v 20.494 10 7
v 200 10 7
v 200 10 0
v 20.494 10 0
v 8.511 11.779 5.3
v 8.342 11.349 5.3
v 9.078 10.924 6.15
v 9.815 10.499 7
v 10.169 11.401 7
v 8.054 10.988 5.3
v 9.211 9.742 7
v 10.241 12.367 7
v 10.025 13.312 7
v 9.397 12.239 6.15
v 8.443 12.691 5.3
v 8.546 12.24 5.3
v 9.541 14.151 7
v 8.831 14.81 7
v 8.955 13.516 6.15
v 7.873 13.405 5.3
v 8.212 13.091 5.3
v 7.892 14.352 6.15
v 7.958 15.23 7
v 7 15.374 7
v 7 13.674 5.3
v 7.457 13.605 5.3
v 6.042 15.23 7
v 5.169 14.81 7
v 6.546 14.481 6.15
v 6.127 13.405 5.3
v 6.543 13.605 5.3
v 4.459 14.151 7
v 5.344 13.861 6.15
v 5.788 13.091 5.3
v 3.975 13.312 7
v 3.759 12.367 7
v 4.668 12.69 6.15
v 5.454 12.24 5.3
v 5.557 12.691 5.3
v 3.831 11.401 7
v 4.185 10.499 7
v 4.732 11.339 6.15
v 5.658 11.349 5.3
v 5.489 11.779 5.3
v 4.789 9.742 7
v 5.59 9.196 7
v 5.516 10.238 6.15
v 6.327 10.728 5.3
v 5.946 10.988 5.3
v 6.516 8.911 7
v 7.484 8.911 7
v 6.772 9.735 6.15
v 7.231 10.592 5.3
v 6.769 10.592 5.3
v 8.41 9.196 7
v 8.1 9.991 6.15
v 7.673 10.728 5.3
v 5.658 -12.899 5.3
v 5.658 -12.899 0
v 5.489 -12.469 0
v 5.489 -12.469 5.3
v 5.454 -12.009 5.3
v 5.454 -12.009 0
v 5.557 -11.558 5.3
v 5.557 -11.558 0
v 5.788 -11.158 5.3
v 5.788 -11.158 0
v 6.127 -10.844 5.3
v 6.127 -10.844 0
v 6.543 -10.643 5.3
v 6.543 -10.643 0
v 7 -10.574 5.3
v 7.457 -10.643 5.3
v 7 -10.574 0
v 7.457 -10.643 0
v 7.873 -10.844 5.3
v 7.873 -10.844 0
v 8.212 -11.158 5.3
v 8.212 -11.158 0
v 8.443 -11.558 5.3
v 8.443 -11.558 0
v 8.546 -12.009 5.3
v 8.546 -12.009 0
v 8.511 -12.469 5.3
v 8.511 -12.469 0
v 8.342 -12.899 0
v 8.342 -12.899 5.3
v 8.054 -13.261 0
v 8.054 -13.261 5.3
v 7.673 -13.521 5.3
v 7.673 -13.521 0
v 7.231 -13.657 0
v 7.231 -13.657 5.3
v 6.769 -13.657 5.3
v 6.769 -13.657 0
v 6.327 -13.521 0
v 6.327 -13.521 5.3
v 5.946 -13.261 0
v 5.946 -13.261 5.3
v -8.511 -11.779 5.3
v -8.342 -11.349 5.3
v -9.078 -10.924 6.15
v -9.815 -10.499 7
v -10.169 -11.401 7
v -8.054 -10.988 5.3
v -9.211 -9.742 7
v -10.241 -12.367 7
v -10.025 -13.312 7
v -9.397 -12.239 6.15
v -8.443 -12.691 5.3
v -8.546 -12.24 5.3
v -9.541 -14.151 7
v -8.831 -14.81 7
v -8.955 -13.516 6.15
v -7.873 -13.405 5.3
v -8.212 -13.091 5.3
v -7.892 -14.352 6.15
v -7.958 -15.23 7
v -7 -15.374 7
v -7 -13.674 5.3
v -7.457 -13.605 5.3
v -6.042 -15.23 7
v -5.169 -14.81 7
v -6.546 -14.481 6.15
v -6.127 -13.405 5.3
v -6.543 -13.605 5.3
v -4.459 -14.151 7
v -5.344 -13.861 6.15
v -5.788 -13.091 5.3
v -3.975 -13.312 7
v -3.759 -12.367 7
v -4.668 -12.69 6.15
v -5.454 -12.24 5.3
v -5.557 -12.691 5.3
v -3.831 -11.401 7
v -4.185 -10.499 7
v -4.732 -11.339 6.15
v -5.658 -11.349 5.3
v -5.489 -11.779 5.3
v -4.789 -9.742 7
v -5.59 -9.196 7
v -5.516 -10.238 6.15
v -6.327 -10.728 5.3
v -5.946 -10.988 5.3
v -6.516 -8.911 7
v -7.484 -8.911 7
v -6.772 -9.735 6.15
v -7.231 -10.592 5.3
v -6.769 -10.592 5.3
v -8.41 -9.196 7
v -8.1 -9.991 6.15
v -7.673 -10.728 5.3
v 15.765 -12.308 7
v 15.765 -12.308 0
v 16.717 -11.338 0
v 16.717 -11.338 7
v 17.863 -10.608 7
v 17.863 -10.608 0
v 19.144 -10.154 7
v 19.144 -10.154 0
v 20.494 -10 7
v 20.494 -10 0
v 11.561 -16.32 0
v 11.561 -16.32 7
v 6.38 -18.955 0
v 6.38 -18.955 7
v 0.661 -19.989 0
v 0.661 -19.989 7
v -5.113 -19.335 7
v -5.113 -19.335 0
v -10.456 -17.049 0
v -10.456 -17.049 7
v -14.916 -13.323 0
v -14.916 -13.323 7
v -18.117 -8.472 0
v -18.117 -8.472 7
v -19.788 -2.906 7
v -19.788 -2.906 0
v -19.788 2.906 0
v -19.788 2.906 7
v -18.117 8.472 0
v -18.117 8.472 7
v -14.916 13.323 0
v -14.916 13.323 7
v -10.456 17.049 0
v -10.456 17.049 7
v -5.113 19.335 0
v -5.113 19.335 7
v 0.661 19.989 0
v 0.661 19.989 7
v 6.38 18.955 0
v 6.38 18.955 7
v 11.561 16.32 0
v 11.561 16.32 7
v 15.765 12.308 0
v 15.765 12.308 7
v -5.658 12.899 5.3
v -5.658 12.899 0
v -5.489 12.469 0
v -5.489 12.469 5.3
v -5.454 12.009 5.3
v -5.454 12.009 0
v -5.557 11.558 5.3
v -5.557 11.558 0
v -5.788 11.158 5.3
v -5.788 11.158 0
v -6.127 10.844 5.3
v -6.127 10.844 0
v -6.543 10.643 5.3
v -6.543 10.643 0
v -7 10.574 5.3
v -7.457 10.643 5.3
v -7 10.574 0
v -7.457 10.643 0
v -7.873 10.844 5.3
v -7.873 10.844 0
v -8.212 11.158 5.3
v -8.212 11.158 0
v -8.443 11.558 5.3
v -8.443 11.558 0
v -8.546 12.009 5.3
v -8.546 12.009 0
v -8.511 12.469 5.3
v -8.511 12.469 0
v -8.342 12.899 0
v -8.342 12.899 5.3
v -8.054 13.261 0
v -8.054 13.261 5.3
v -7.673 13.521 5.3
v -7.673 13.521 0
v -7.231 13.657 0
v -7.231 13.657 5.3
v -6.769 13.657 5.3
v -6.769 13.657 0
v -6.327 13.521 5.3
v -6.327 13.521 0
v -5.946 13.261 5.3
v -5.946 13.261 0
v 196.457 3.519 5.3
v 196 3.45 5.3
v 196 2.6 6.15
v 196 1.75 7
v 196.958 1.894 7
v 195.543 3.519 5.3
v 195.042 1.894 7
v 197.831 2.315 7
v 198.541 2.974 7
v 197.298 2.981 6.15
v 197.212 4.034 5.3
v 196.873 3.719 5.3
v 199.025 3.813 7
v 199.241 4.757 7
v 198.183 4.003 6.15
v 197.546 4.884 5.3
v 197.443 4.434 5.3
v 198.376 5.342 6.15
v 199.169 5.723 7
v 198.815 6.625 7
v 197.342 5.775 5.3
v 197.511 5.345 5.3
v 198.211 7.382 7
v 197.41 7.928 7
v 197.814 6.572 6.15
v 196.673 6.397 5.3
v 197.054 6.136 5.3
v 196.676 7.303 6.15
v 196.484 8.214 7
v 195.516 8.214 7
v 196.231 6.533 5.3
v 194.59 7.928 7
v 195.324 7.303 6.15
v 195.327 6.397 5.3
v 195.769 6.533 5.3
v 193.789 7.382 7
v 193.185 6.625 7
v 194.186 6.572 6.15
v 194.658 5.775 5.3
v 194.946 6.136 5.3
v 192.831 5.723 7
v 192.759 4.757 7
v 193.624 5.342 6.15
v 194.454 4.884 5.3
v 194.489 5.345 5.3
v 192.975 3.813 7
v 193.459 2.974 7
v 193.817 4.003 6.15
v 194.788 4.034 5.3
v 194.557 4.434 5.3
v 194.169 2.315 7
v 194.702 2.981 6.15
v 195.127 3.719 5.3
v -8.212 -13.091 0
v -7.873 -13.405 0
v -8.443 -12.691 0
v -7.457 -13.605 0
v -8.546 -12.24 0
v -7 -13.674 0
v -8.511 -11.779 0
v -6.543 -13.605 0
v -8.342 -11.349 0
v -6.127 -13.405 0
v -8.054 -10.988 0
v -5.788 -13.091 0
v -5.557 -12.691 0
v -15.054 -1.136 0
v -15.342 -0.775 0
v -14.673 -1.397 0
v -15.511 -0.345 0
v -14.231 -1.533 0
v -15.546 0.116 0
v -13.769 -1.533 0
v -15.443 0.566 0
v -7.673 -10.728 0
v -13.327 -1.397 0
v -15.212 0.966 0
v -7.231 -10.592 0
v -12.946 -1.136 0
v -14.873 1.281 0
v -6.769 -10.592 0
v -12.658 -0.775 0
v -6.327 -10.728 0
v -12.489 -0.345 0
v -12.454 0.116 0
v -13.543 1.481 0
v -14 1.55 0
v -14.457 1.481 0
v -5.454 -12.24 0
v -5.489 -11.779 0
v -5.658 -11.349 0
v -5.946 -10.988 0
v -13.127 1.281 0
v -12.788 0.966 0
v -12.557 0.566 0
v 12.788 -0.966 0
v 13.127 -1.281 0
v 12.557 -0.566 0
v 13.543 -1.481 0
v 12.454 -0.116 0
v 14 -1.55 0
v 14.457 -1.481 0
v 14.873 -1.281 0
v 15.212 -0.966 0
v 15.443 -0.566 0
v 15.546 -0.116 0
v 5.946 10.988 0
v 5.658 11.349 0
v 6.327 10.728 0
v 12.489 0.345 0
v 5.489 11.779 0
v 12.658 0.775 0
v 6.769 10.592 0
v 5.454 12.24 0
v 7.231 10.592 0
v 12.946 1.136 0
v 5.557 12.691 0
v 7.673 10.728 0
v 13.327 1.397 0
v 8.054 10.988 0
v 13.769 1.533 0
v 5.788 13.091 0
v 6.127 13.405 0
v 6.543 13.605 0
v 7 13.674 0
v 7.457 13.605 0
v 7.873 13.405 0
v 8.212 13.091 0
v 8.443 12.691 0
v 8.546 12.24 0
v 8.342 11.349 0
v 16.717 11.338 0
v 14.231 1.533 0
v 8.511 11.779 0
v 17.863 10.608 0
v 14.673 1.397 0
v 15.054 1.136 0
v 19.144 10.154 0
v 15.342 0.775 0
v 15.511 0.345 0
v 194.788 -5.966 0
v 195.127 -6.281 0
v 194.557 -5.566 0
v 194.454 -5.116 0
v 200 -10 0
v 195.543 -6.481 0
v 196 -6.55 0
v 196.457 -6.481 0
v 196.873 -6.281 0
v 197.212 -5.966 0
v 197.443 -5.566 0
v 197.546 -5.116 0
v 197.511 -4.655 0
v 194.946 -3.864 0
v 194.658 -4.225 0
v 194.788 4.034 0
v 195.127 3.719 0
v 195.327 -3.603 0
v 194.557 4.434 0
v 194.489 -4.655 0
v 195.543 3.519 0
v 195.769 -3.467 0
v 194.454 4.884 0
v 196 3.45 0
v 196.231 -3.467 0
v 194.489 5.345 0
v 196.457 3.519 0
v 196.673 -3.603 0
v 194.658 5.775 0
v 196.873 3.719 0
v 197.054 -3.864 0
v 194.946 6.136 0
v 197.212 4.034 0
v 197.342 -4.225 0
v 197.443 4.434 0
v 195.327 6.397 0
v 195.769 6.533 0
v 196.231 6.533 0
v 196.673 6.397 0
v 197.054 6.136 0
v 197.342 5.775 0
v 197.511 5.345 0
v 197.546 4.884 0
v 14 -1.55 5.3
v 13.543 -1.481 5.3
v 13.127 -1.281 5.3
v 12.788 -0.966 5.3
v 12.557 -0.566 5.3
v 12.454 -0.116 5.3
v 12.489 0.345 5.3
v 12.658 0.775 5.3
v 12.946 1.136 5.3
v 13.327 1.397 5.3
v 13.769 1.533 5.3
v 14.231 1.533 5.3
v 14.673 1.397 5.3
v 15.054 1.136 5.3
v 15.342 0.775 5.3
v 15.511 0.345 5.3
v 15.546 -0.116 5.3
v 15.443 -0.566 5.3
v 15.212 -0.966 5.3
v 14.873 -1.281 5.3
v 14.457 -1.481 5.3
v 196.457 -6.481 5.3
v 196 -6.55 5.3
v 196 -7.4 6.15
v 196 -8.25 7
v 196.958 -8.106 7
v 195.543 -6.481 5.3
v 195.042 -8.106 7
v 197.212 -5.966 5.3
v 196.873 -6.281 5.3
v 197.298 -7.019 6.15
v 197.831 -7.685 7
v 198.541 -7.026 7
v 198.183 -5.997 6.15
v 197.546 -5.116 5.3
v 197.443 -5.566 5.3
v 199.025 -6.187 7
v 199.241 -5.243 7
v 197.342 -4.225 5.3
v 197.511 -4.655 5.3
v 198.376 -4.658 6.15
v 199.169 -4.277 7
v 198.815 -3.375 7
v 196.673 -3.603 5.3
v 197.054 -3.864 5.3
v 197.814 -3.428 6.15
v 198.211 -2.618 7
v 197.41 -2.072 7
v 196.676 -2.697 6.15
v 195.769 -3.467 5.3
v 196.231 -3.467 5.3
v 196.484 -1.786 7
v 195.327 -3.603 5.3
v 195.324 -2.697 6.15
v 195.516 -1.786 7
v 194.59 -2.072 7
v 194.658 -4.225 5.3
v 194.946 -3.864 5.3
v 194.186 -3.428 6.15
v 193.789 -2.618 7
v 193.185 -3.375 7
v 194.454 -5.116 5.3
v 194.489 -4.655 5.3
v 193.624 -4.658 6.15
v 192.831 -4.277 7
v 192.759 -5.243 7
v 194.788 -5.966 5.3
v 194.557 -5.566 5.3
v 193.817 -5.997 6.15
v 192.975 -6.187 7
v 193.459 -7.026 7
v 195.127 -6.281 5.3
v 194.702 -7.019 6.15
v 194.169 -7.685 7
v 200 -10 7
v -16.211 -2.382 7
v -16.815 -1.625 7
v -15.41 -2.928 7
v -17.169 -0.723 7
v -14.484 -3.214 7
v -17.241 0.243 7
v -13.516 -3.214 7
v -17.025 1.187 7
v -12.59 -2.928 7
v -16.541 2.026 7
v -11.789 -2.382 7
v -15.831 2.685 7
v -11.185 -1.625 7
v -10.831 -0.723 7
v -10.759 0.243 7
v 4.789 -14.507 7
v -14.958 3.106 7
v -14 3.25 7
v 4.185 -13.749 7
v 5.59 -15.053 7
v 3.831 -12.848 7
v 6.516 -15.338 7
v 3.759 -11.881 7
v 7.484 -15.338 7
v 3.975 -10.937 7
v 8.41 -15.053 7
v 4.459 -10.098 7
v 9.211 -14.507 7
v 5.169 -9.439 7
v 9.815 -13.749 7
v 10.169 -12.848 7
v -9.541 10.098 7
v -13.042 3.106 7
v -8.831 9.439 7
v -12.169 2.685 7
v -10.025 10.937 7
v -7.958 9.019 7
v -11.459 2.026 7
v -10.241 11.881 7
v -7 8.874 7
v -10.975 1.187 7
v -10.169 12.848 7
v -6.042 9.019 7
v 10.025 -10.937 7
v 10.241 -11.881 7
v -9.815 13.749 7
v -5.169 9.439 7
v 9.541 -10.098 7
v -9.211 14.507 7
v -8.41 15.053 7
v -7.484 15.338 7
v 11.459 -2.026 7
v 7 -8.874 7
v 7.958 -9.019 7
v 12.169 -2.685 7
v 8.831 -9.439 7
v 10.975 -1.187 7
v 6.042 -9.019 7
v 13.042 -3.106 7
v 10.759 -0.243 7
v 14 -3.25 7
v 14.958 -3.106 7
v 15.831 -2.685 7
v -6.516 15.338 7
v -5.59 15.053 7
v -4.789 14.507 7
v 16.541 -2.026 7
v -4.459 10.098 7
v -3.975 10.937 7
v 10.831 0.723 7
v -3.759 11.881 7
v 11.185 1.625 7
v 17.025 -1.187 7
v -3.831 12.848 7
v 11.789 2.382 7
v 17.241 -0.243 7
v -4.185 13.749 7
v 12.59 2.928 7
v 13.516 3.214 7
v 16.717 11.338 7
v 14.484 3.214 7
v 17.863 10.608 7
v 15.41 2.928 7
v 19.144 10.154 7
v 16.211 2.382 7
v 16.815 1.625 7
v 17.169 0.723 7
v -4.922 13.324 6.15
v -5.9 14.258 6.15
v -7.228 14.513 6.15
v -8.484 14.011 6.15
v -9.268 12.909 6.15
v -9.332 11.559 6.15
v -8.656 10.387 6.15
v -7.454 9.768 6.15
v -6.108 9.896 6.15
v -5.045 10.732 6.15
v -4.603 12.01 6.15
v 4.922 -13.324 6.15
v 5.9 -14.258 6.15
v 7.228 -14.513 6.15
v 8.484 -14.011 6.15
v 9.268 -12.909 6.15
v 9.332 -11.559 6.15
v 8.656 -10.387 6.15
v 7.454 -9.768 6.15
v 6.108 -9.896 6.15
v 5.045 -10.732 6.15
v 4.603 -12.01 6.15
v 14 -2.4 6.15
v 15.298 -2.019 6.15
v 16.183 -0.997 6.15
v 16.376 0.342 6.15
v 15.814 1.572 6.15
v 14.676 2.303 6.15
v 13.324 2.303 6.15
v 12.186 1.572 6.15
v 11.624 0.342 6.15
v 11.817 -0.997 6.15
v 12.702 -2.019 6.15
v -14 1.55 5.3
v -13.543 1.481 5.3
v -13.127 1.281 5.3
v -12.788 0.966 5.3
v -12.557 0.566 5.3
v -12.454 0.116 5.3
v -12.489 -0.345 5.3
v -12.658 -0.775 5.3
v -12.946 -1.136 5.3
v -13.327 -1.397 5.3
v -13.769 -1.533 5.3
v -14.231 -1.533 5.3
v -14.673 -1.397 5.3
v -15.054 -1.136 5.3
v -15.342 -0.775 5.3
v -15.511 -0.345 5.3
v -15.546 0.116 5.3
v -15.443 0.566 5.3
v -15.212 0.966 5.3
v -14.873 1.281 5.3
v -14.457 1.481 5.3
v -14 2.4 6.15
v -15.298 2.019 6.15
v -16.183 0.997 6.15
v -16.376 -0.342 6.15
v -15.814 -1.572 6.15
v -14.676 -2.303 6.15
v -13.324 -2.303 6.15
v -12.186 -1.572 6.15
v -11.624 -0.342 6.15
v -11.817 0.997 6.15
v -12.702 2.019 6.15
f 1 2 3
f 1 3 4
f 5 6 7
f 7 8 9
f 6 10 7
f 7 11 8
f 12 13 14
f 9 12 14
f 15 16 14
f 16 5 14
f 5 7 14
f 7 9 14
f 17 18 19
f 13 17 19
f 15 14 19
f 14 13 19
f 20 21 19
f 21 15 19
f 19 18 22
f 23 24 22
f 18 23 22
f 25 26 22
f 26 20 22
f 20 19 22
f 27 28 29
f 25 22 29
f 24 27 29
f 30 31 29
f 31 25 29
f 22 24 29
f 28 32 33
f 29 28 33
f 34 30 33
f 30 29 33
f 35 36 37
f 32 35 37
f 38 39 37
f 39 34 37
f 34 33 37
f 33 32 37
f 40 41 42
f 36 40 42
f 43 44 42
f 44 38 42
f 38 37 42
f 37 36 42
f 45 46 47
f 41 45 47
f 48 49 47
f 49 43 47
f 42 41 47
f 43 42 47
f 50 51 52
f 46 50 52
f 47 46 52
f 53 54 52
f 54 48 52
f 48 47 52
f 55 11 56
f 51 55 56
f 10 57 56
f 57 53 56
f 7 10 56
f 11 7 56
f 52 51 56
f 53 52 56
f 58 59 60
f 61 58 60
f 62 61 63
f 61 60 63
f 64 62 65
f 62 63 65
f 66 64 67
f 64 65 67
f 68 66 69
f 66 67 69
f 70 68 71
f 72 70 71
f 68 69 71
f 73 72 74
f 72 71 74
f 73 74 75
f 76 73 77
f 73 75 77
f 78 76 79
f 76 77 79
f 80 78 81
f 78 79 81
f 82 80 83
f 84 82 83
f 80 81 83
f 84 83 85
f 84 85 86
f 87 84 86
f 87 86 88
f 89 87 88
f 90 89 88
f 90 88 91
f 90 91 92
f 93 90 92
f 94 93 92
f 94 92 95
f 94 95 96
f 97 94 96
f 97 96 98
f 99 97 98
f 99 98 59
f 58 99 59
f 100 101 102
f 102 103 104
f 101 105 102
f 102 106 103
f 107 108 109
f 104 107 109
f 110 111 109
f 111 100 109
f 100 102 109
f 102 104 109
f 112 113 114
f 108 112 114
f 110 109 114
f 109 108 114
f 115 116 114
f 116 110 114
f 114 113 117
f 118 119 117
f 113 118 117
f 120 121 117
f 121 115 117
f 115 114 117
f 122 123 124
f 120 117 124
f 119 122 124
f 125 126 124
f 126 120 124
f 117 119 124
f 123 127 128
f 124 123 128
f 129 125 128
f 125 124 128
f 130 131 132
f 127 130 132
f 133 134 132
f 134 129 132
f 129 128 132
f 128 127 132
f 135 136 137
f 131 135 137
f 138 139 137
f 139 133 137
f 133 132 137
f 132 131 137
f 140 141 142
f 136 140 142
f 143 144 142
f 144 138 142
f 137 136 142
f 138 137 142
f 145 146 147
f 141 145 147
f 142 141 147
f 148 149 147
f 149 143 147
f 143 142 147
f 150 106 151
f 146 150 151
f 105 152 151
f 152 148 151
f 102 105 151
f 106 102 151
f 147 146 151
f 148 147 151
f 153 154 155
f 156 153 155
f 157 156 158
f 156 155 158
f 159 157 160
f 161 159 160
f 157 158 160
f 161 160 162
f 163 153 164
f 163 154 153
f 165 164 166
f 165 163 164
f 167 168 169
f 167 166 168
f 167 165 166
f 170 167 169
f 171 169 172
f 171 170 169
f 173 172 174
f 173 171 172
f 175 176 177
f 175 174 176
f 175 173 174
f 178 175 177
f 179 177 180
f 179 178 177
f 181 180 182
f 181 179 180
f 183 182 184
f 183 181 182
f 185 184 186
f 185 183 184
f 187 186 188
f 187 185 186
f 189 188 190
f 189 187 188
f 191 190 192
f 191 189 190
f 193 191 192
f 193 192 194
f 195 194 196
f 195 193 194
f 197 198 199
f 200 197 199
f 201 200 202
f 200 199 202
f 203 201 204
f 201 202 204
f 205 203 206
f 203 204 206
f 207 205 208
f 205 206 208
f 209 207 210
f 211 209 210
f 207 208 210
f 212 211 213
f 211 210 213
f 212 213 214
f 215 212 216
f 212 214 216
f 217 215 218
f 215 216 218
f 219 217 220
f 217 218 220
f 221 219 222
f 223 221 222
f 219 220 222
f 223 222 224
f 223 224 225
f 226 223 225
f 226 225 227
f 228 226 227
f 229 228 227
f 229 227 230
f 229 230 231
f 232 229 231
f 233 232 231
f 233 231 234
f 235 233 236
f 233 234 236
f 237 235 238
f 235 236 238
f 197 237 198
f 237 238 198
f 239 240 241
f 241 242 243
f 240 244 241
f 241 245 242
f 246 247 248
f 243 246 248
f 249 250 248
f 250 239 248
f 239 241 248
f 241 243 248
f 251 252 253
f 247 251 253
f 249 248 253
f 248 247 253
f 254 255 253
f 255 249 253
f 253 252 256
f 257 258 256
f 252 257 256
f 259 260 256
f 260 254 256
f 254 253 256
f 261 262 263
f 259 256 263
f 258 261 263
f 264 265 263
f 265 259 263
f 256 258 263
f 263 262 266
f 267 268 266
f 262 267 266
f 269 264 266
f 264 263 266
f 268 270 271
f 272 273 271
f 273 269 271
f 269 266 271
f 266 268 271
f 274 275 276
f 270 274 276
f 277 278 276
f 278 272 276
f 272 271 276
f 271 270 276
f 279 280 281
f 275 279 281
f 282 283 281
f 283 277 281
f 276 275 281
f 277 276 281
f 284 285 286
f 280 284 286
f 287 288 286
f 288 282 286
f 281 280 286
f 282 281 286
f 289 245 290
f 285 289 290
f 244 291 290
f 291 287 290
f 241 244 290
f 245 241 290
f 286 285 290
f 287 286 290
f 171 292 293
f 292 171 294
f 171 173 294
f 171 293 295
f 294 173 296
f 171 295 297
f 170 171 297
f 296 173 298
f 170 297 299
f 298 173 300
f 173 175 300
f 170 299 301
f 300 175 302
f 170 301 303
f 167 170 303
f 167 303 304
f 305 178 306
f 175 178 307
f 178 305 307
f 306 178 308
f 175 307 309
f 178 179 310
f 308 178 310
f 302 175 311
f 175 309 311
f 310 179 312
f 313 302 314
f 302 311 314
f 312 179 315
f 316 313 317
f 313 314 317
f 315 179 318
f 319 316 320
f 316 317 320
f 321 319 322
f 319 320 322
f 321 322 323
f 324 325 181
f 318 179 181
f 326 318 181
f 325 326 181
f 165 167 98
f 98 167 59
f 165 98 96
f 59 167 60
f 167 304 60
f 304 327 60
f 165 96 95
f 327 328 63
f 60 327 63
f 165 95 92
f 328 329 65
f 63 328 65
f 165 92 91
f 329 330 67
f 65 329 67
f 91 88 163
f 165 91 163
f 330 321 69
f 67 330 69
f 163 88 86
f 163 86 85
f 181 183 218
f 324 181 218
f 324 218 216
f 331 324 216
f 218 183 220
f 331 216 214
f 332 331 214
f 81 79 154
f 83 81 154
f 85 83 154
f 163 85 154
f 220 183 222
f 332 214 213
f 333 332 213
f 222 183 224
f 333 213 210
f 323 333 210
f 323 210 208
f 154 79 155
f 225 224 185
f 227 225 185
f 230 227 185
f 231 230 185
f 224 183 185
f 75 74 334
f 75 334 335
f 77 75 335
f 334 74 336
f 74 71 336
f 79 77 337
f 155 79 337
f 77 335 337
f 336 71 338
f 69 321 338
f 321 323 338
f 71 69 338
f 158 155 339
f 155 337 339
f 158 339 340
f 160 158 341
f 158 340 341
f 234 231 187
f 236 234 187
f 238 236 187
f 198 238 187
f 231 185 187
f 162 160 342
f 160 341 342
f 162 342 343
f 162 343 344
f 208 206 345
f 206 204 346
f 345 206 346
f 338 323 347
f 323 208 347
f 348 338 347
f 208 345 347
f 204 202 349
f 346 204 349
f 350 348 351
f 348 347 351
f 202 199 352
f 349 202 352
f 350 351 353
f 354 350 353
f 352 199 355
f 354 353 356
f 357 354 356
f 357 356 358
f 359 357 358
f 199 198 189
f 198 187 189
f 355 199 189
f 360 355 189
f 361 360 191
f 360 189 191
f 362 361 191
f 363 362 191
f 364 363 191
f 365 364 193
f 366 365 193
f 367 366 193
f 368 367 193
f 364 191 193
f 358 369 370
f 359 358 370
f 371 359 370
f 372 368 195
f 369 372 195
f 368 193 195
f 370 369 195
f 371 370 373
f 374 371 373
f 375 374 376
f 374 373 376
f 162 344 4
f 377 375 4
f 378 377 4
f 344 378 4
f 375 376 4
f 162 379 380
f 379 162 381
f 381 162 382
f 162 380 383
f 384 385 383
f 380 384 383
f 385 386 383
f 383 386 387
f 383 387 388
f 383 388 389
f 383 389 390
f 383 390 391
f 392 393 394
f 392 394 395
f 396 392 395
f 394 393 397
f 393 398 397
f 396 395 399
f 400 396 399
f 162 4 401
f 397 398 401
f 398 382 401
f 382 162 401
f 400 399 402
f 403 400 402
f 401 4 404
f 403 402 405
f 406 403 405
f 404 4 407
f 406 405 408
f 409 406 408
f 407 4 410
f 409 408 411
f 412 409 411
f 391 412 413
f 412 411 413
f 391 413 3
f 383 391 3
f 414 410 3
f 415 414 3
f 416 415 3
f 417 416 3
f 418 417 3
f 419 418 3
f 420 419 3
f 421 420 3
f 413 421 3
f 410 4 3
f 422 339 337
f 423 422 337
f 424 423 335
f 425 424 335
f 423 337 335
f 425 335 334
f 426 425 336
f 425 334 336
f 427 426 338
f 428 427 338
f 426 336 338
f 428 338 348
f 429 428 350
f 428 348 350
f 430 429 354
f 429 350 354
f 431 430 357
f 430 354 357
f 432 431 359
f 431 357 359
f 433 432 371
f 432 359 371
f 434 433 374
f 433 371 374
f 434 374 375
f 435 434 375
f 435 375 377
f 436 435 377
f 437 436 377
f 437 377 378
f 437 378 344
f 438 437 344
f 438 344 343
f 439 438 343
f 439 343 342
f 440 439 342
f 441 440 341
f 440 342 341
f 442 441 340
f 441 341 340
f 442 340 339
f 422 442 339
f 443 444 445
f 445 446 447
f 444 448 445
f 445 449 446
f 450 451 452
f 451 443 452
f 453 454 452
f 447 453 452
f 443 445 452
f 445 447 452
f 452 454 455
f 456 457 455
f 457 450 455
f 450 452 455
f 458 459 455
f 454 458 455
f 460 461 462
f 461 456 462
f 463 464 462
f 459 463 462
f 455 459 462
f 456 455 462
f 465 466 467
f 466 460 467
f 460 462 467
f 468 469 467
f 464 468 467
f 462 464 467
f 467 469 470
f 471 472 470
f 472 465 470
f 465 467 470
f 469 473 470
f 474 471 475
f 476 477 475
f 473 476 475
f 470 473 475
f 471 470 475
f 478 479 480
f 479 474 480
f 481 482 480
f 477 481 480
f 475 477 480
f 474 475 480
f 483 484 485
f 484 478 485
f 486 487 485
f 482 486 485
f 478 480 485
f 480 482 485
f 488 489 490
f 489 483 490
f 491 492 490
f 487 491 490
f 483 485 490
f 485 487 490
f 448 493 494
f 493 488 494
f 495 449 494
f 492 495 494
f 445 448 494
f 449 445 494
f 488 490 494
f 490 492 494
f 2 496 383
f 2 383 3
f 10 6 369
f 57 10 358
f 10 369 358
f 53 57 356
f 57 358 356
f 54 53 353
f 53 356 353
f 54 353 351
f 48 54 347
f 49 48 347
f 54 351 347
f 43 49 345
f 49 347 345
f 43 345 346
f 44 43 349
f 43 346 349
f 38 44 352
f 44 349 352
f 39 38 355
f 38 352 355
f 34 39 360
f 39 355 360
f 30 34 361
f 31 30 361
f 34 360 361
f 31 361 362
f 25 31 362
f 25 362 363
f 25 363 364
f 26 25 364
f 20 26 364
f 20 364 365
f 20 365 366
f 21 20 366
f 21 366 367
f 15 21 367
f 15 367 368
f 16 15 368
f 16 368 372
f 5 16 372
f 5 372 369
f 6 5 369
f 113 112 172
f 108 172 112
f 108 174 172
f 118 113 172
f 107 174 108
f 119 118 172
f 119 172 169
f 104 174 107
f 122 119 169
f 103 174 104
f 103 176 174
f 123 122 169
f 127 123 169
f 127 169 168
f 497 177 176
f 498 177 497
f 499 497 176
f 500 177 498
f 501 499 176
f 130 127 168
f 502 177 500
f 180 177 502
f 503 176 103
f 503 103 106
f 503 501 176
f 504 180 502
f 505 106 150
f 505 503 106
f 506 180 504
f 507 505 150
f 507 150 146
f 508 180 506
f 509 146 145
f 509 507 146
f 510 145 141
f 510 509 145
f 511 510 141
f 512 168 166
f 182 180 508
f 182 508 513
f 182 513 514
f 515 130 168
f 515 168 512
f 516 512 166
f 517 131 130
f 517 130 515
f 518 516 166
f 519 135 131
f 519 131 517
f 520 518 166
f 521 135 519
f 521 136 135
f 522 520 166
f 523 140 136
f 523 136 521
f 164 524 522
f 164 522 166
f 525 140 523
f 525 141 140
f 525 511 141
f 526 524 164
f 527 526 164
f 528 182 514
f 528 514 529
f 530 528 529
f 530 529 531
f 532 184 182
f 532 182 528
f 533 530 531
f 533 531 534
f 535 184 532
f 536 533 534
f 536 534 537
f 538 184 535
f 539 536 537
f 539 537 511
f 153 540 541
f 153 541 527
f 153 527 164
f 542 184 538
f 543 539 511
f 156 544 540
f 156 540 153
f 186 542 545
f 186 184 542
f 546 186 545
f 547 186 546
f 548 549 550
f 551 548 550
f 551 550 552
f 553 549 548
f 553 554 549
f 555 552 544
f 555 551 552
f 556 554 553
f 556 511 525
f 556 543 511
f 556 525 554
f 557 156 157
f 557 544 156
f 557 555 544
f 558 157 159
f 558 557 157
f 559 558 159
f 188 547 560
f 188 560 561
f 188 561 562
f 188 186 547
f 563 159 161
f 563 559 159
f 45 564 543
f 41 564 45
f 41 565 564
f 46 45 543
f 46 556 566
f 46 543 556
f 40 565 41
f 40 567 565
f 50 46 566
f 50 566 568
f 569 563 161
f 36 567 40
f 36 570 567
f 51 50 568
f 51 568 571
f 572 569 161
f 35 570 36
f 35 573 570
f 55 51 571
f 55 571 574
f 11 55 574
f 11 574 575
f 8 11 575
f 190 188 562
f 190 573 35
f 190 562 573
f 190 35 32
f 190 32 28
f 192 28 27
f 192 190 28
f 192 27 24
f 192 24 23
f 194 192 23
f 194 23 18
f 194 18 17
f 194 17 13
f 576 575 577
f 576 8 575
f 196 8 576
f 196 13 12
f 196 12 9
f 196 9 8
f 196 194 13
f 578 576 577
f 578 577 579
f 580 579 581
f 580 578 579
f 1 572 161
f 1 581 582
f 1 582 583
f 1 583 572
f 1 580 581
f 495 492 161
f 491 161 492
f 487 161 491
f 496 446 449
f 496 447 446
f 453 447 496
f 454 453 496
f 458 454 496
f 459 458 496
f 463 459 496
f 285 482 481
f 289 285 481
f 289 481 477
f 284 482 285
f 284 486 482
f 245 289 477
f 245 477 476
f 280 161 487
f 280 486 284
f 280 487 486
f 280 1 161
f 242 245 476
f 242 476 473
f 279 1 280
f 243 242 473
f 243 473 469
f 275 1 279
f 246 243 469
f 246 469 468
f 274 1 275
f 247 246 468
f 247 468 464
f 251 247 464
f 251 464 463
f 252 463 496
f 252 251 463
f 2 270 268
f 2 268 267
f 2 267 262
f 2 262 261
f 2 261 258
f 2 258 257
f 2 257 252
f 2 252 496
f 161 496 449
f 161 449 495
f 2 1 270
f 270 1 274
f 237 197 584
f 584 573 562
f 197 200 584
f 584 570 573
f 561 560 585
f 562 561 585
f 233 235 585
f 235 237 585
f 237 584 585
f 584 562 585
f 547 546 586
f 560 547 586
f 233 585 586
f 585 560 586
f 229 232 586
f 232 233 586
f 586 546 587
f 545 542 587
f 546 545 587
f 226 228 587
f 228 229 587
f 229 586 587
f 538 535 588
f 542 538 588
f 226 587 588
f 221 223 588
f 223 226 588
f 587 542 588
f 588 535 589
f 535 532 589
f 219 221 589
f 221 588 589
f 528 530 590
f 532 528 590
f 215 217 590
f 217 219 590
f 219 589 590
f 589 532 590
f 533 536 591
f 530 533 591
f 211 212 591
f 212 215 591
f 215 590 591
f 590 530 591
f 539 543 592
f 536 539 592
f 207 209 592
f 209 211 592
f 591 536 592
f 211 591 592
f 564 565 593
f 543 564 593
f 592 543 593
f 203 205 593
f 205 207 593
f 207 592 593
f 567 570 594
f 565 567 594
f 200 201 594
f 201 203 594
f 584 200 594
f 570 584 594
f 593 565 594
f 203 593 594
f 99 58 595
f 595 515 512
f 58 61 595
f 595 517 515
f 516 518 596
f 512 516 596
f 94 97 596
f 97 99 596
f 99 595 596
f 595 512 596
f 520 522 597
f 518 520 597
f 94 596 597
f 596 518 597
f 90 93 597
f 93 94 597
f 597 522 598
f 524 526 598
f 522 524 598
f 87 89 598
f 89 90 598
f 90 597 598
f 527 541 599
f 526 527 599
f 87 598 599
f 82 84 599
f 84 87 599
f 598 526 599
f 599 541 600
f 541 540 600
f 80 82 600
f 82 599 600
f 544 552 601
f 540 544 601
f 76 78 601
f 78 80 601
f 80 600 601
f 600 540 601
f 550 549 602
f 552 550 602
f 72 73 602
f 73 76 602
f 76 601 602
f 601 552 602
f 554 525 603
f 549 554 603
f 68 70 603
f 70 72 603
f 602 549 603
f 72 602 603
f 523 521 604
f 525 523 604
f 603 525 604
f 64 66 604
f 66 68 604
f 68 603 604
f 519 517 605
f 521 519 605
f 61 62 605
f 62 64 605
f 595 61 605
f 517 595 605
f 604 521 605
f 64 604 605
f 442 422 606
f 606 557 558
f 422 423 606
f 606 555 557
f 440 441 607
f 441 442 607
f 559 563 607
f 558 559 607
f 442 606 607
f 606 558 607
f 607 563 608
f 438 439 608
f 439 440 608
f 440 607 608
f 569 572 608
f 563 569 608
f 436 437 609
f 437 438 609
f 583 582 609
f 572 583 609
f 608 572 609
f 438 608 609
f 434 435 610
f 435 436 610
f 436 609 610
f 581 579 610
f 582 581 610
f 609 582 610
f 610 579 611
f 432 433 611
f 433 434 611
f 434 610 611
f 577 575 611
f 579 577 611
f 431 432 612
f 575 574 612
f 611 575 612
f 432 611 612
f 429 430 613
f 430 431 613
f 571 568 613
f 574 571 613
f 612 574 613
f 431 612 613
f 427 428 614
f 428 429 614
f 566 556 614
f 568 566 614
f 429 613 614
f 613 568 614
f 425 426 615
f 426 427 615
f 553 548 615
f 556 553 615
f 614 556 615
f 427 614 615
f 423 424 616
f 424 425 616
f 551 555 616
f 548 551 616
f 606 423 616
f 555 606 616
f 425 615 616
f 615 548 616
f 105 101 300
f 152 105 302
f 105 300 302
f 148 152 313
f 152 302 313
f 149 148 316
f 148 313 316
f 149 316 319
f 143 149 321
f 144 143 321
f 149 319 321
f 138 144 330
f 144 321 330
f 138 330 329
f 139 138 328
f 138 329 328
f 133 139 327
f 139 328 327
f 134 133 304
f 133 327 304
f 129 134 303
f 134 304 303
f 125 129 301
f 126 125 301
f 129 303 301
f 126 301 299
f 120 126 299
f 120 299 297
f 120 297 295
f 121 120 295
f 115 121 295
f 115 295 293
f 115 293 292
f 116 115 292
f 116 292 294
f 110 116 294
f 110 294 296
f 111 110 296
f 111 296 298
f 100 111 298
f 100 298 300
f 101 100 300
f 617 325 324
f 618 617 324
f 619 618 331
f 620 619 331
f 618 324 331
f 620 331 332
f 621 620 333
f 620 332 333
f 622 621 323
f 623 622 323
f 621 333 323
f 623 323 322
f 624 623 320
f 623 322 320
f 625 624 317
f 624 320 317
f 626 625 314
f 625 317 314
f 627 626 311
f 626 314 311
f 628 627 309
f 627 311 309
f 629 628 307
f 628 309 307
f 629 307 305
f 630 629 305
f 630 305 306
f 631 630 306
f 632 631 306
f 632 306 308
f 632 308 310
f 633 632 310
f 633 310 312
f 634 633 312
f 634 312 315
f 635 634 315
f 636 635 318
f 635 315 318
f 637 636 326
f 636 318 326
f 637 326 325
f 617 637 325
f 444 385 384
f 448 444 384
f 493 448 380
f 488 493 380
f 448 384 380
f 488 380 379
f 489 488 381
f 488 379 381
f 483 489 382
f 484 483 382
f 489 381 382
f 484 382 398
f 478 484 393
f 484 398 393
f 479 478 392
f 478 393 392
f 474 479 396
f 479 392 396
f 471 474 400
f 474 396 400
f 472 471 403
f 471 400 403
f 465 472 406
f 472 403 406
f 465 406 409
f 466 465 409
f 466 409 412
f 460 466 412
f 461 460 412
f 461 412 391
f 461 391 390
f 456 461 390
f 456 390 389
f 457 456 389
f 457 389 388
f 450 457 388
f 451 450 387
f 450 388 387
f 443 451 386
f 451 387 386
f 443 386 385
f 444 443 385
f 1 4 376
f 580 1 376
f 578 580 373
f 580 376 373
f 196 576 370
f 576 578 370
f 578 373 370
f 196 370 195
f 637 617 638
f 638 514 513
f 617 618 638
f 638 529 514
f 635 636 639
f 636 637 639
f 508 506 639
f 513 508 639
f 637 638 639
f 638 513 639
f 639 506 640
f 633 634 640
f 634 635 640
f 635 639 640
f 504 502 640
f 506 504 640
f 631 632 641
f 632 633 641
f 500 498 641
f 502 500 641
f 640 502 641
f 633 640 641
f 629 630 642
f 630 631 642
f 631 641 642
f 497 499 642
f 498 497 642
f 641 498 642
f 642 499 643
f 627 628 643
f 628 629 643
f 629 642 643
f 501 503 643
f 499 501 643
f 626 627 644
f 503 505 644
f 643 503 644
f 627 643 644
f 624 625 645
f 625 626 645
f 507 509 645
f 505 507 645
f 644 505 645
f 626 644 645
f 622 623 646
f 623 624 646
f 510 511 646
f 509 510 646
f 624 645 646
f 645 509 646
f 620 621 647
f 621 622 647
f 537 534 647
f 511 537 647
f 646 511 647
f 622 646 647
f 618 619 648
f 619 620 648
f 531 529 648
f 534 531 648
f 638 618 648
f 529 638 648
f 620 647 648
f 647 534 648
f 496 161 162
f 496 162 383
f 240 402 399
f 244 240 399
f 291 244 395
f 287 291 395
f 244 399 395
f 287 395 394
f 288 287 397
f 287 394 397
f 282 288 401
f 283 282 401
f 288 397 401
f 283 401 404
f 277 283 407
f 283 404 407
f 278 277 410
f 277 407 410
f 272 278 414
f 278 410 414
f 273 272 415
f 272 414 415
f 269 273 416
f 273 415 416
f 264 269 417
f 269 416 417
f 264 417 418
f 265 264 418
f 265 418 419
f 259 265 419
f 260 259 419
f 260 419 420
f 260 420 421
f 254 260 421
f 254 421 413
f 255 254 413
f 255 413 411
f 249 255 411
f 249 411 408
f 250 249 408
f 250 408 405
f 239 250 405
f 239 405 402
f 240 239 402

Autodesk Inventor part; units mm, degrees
ref_plane "YZ Plane" through (0, 0, 0) normal (1, 0, 0) x (0, 1, 0)
ref_plane "XZ Plane" through (0, 0, 0) normal (0, 1, 0) x (-1, 0, 0)
ref_plane "XY Plane" through (0, 0, 0) normal (0, 0, 1) x (1, 0, 0)
sketch "스케치1" plane through (0, 0, 0) normal (0, 0, 1) x (1, 0, 0)
  circle A0 centre (0, 0) radius 20
  dimension "d0" = 40
extrude "돌출1" add sketch "스케치1" along normal blind 7
sketch "스케치2" plane through (0, 0, 7) normal (0, 0, 1) x (1, 0, 0)
  circle A0 centre (0, 0) radius 20 projected
  line L0 (17.3205, 10) -> (17.3205, -10)
  line L1 (17.3205, -10) -> (200, -10)
  line L2 (200, -10) -> (200, 10)
  line L3 (200, 10) -> (17.3205, 10)
  dimension "d4" = 10
  dimension "d5" = 20
  dimension "d8" = 200
extrude "돌출2" add sketch "스케치2" against normal blind 7 contours A0 L3 L2 L1
sketch "스케치3" plane through (0, 0, 7) normal (0, 0, 1) x (1, 0, 0)
  circle A0 centre (0, 0) radius 14
  circle A1 centre (14, 0) radius 1.55
  dimension "d9" = 28
  dimension "d10" = 3.1
hole "구멍1" at (14, 0, 7) direction (0, 0, -1) diameter 3.1 depth 20 countersink diameter 6.5 countersink angle 90
pattern_circular "원형 패턴1" count 6 over 360 about axis through (0, 0, 0) along (0, 0, 1) of "구멍1"
fillet "모깎기1" radius 6 2 edges at (17.3205, 10, 3.5) (17.3205, -10, 3.5)
sketch "스케치4" plane through (0, 0, 7) normal (0, 0, 1) x (1, 0, 0)
  line L0 (20.4939, -10) -> (200, -10) projected
  line L1 (20.4939, 10) -> (200, 10) projected
  line L2 (200, -10) -> (192, -10)
  line L3 (192, -10) -> (192, 10)
  line L4 (192, 10) -> (200, 10)
  line L5 (200, 10) -> (200, -10)
  line L6 (196, 10) -> (196, -10)
  circle A0 centre (196, 5) radius 1.5
  circle A1 centre (196, -5) radius 1.5
  point P0 (0, 0)
  dimension "d22" = 8
  dimension "d23" = 3
  dimension "d24" = 3
  dimension "d25" = 5
  dimension "d26" = 10
  dimension "d27" = 5
hole "구멍2" at (196, 5, 7) at (196, -5, 7) direction (0, 0, -1) diameter 3.1 depth 20 countersink diameter 6.5 countersink angle 90
properties part number "test_arm_2"
